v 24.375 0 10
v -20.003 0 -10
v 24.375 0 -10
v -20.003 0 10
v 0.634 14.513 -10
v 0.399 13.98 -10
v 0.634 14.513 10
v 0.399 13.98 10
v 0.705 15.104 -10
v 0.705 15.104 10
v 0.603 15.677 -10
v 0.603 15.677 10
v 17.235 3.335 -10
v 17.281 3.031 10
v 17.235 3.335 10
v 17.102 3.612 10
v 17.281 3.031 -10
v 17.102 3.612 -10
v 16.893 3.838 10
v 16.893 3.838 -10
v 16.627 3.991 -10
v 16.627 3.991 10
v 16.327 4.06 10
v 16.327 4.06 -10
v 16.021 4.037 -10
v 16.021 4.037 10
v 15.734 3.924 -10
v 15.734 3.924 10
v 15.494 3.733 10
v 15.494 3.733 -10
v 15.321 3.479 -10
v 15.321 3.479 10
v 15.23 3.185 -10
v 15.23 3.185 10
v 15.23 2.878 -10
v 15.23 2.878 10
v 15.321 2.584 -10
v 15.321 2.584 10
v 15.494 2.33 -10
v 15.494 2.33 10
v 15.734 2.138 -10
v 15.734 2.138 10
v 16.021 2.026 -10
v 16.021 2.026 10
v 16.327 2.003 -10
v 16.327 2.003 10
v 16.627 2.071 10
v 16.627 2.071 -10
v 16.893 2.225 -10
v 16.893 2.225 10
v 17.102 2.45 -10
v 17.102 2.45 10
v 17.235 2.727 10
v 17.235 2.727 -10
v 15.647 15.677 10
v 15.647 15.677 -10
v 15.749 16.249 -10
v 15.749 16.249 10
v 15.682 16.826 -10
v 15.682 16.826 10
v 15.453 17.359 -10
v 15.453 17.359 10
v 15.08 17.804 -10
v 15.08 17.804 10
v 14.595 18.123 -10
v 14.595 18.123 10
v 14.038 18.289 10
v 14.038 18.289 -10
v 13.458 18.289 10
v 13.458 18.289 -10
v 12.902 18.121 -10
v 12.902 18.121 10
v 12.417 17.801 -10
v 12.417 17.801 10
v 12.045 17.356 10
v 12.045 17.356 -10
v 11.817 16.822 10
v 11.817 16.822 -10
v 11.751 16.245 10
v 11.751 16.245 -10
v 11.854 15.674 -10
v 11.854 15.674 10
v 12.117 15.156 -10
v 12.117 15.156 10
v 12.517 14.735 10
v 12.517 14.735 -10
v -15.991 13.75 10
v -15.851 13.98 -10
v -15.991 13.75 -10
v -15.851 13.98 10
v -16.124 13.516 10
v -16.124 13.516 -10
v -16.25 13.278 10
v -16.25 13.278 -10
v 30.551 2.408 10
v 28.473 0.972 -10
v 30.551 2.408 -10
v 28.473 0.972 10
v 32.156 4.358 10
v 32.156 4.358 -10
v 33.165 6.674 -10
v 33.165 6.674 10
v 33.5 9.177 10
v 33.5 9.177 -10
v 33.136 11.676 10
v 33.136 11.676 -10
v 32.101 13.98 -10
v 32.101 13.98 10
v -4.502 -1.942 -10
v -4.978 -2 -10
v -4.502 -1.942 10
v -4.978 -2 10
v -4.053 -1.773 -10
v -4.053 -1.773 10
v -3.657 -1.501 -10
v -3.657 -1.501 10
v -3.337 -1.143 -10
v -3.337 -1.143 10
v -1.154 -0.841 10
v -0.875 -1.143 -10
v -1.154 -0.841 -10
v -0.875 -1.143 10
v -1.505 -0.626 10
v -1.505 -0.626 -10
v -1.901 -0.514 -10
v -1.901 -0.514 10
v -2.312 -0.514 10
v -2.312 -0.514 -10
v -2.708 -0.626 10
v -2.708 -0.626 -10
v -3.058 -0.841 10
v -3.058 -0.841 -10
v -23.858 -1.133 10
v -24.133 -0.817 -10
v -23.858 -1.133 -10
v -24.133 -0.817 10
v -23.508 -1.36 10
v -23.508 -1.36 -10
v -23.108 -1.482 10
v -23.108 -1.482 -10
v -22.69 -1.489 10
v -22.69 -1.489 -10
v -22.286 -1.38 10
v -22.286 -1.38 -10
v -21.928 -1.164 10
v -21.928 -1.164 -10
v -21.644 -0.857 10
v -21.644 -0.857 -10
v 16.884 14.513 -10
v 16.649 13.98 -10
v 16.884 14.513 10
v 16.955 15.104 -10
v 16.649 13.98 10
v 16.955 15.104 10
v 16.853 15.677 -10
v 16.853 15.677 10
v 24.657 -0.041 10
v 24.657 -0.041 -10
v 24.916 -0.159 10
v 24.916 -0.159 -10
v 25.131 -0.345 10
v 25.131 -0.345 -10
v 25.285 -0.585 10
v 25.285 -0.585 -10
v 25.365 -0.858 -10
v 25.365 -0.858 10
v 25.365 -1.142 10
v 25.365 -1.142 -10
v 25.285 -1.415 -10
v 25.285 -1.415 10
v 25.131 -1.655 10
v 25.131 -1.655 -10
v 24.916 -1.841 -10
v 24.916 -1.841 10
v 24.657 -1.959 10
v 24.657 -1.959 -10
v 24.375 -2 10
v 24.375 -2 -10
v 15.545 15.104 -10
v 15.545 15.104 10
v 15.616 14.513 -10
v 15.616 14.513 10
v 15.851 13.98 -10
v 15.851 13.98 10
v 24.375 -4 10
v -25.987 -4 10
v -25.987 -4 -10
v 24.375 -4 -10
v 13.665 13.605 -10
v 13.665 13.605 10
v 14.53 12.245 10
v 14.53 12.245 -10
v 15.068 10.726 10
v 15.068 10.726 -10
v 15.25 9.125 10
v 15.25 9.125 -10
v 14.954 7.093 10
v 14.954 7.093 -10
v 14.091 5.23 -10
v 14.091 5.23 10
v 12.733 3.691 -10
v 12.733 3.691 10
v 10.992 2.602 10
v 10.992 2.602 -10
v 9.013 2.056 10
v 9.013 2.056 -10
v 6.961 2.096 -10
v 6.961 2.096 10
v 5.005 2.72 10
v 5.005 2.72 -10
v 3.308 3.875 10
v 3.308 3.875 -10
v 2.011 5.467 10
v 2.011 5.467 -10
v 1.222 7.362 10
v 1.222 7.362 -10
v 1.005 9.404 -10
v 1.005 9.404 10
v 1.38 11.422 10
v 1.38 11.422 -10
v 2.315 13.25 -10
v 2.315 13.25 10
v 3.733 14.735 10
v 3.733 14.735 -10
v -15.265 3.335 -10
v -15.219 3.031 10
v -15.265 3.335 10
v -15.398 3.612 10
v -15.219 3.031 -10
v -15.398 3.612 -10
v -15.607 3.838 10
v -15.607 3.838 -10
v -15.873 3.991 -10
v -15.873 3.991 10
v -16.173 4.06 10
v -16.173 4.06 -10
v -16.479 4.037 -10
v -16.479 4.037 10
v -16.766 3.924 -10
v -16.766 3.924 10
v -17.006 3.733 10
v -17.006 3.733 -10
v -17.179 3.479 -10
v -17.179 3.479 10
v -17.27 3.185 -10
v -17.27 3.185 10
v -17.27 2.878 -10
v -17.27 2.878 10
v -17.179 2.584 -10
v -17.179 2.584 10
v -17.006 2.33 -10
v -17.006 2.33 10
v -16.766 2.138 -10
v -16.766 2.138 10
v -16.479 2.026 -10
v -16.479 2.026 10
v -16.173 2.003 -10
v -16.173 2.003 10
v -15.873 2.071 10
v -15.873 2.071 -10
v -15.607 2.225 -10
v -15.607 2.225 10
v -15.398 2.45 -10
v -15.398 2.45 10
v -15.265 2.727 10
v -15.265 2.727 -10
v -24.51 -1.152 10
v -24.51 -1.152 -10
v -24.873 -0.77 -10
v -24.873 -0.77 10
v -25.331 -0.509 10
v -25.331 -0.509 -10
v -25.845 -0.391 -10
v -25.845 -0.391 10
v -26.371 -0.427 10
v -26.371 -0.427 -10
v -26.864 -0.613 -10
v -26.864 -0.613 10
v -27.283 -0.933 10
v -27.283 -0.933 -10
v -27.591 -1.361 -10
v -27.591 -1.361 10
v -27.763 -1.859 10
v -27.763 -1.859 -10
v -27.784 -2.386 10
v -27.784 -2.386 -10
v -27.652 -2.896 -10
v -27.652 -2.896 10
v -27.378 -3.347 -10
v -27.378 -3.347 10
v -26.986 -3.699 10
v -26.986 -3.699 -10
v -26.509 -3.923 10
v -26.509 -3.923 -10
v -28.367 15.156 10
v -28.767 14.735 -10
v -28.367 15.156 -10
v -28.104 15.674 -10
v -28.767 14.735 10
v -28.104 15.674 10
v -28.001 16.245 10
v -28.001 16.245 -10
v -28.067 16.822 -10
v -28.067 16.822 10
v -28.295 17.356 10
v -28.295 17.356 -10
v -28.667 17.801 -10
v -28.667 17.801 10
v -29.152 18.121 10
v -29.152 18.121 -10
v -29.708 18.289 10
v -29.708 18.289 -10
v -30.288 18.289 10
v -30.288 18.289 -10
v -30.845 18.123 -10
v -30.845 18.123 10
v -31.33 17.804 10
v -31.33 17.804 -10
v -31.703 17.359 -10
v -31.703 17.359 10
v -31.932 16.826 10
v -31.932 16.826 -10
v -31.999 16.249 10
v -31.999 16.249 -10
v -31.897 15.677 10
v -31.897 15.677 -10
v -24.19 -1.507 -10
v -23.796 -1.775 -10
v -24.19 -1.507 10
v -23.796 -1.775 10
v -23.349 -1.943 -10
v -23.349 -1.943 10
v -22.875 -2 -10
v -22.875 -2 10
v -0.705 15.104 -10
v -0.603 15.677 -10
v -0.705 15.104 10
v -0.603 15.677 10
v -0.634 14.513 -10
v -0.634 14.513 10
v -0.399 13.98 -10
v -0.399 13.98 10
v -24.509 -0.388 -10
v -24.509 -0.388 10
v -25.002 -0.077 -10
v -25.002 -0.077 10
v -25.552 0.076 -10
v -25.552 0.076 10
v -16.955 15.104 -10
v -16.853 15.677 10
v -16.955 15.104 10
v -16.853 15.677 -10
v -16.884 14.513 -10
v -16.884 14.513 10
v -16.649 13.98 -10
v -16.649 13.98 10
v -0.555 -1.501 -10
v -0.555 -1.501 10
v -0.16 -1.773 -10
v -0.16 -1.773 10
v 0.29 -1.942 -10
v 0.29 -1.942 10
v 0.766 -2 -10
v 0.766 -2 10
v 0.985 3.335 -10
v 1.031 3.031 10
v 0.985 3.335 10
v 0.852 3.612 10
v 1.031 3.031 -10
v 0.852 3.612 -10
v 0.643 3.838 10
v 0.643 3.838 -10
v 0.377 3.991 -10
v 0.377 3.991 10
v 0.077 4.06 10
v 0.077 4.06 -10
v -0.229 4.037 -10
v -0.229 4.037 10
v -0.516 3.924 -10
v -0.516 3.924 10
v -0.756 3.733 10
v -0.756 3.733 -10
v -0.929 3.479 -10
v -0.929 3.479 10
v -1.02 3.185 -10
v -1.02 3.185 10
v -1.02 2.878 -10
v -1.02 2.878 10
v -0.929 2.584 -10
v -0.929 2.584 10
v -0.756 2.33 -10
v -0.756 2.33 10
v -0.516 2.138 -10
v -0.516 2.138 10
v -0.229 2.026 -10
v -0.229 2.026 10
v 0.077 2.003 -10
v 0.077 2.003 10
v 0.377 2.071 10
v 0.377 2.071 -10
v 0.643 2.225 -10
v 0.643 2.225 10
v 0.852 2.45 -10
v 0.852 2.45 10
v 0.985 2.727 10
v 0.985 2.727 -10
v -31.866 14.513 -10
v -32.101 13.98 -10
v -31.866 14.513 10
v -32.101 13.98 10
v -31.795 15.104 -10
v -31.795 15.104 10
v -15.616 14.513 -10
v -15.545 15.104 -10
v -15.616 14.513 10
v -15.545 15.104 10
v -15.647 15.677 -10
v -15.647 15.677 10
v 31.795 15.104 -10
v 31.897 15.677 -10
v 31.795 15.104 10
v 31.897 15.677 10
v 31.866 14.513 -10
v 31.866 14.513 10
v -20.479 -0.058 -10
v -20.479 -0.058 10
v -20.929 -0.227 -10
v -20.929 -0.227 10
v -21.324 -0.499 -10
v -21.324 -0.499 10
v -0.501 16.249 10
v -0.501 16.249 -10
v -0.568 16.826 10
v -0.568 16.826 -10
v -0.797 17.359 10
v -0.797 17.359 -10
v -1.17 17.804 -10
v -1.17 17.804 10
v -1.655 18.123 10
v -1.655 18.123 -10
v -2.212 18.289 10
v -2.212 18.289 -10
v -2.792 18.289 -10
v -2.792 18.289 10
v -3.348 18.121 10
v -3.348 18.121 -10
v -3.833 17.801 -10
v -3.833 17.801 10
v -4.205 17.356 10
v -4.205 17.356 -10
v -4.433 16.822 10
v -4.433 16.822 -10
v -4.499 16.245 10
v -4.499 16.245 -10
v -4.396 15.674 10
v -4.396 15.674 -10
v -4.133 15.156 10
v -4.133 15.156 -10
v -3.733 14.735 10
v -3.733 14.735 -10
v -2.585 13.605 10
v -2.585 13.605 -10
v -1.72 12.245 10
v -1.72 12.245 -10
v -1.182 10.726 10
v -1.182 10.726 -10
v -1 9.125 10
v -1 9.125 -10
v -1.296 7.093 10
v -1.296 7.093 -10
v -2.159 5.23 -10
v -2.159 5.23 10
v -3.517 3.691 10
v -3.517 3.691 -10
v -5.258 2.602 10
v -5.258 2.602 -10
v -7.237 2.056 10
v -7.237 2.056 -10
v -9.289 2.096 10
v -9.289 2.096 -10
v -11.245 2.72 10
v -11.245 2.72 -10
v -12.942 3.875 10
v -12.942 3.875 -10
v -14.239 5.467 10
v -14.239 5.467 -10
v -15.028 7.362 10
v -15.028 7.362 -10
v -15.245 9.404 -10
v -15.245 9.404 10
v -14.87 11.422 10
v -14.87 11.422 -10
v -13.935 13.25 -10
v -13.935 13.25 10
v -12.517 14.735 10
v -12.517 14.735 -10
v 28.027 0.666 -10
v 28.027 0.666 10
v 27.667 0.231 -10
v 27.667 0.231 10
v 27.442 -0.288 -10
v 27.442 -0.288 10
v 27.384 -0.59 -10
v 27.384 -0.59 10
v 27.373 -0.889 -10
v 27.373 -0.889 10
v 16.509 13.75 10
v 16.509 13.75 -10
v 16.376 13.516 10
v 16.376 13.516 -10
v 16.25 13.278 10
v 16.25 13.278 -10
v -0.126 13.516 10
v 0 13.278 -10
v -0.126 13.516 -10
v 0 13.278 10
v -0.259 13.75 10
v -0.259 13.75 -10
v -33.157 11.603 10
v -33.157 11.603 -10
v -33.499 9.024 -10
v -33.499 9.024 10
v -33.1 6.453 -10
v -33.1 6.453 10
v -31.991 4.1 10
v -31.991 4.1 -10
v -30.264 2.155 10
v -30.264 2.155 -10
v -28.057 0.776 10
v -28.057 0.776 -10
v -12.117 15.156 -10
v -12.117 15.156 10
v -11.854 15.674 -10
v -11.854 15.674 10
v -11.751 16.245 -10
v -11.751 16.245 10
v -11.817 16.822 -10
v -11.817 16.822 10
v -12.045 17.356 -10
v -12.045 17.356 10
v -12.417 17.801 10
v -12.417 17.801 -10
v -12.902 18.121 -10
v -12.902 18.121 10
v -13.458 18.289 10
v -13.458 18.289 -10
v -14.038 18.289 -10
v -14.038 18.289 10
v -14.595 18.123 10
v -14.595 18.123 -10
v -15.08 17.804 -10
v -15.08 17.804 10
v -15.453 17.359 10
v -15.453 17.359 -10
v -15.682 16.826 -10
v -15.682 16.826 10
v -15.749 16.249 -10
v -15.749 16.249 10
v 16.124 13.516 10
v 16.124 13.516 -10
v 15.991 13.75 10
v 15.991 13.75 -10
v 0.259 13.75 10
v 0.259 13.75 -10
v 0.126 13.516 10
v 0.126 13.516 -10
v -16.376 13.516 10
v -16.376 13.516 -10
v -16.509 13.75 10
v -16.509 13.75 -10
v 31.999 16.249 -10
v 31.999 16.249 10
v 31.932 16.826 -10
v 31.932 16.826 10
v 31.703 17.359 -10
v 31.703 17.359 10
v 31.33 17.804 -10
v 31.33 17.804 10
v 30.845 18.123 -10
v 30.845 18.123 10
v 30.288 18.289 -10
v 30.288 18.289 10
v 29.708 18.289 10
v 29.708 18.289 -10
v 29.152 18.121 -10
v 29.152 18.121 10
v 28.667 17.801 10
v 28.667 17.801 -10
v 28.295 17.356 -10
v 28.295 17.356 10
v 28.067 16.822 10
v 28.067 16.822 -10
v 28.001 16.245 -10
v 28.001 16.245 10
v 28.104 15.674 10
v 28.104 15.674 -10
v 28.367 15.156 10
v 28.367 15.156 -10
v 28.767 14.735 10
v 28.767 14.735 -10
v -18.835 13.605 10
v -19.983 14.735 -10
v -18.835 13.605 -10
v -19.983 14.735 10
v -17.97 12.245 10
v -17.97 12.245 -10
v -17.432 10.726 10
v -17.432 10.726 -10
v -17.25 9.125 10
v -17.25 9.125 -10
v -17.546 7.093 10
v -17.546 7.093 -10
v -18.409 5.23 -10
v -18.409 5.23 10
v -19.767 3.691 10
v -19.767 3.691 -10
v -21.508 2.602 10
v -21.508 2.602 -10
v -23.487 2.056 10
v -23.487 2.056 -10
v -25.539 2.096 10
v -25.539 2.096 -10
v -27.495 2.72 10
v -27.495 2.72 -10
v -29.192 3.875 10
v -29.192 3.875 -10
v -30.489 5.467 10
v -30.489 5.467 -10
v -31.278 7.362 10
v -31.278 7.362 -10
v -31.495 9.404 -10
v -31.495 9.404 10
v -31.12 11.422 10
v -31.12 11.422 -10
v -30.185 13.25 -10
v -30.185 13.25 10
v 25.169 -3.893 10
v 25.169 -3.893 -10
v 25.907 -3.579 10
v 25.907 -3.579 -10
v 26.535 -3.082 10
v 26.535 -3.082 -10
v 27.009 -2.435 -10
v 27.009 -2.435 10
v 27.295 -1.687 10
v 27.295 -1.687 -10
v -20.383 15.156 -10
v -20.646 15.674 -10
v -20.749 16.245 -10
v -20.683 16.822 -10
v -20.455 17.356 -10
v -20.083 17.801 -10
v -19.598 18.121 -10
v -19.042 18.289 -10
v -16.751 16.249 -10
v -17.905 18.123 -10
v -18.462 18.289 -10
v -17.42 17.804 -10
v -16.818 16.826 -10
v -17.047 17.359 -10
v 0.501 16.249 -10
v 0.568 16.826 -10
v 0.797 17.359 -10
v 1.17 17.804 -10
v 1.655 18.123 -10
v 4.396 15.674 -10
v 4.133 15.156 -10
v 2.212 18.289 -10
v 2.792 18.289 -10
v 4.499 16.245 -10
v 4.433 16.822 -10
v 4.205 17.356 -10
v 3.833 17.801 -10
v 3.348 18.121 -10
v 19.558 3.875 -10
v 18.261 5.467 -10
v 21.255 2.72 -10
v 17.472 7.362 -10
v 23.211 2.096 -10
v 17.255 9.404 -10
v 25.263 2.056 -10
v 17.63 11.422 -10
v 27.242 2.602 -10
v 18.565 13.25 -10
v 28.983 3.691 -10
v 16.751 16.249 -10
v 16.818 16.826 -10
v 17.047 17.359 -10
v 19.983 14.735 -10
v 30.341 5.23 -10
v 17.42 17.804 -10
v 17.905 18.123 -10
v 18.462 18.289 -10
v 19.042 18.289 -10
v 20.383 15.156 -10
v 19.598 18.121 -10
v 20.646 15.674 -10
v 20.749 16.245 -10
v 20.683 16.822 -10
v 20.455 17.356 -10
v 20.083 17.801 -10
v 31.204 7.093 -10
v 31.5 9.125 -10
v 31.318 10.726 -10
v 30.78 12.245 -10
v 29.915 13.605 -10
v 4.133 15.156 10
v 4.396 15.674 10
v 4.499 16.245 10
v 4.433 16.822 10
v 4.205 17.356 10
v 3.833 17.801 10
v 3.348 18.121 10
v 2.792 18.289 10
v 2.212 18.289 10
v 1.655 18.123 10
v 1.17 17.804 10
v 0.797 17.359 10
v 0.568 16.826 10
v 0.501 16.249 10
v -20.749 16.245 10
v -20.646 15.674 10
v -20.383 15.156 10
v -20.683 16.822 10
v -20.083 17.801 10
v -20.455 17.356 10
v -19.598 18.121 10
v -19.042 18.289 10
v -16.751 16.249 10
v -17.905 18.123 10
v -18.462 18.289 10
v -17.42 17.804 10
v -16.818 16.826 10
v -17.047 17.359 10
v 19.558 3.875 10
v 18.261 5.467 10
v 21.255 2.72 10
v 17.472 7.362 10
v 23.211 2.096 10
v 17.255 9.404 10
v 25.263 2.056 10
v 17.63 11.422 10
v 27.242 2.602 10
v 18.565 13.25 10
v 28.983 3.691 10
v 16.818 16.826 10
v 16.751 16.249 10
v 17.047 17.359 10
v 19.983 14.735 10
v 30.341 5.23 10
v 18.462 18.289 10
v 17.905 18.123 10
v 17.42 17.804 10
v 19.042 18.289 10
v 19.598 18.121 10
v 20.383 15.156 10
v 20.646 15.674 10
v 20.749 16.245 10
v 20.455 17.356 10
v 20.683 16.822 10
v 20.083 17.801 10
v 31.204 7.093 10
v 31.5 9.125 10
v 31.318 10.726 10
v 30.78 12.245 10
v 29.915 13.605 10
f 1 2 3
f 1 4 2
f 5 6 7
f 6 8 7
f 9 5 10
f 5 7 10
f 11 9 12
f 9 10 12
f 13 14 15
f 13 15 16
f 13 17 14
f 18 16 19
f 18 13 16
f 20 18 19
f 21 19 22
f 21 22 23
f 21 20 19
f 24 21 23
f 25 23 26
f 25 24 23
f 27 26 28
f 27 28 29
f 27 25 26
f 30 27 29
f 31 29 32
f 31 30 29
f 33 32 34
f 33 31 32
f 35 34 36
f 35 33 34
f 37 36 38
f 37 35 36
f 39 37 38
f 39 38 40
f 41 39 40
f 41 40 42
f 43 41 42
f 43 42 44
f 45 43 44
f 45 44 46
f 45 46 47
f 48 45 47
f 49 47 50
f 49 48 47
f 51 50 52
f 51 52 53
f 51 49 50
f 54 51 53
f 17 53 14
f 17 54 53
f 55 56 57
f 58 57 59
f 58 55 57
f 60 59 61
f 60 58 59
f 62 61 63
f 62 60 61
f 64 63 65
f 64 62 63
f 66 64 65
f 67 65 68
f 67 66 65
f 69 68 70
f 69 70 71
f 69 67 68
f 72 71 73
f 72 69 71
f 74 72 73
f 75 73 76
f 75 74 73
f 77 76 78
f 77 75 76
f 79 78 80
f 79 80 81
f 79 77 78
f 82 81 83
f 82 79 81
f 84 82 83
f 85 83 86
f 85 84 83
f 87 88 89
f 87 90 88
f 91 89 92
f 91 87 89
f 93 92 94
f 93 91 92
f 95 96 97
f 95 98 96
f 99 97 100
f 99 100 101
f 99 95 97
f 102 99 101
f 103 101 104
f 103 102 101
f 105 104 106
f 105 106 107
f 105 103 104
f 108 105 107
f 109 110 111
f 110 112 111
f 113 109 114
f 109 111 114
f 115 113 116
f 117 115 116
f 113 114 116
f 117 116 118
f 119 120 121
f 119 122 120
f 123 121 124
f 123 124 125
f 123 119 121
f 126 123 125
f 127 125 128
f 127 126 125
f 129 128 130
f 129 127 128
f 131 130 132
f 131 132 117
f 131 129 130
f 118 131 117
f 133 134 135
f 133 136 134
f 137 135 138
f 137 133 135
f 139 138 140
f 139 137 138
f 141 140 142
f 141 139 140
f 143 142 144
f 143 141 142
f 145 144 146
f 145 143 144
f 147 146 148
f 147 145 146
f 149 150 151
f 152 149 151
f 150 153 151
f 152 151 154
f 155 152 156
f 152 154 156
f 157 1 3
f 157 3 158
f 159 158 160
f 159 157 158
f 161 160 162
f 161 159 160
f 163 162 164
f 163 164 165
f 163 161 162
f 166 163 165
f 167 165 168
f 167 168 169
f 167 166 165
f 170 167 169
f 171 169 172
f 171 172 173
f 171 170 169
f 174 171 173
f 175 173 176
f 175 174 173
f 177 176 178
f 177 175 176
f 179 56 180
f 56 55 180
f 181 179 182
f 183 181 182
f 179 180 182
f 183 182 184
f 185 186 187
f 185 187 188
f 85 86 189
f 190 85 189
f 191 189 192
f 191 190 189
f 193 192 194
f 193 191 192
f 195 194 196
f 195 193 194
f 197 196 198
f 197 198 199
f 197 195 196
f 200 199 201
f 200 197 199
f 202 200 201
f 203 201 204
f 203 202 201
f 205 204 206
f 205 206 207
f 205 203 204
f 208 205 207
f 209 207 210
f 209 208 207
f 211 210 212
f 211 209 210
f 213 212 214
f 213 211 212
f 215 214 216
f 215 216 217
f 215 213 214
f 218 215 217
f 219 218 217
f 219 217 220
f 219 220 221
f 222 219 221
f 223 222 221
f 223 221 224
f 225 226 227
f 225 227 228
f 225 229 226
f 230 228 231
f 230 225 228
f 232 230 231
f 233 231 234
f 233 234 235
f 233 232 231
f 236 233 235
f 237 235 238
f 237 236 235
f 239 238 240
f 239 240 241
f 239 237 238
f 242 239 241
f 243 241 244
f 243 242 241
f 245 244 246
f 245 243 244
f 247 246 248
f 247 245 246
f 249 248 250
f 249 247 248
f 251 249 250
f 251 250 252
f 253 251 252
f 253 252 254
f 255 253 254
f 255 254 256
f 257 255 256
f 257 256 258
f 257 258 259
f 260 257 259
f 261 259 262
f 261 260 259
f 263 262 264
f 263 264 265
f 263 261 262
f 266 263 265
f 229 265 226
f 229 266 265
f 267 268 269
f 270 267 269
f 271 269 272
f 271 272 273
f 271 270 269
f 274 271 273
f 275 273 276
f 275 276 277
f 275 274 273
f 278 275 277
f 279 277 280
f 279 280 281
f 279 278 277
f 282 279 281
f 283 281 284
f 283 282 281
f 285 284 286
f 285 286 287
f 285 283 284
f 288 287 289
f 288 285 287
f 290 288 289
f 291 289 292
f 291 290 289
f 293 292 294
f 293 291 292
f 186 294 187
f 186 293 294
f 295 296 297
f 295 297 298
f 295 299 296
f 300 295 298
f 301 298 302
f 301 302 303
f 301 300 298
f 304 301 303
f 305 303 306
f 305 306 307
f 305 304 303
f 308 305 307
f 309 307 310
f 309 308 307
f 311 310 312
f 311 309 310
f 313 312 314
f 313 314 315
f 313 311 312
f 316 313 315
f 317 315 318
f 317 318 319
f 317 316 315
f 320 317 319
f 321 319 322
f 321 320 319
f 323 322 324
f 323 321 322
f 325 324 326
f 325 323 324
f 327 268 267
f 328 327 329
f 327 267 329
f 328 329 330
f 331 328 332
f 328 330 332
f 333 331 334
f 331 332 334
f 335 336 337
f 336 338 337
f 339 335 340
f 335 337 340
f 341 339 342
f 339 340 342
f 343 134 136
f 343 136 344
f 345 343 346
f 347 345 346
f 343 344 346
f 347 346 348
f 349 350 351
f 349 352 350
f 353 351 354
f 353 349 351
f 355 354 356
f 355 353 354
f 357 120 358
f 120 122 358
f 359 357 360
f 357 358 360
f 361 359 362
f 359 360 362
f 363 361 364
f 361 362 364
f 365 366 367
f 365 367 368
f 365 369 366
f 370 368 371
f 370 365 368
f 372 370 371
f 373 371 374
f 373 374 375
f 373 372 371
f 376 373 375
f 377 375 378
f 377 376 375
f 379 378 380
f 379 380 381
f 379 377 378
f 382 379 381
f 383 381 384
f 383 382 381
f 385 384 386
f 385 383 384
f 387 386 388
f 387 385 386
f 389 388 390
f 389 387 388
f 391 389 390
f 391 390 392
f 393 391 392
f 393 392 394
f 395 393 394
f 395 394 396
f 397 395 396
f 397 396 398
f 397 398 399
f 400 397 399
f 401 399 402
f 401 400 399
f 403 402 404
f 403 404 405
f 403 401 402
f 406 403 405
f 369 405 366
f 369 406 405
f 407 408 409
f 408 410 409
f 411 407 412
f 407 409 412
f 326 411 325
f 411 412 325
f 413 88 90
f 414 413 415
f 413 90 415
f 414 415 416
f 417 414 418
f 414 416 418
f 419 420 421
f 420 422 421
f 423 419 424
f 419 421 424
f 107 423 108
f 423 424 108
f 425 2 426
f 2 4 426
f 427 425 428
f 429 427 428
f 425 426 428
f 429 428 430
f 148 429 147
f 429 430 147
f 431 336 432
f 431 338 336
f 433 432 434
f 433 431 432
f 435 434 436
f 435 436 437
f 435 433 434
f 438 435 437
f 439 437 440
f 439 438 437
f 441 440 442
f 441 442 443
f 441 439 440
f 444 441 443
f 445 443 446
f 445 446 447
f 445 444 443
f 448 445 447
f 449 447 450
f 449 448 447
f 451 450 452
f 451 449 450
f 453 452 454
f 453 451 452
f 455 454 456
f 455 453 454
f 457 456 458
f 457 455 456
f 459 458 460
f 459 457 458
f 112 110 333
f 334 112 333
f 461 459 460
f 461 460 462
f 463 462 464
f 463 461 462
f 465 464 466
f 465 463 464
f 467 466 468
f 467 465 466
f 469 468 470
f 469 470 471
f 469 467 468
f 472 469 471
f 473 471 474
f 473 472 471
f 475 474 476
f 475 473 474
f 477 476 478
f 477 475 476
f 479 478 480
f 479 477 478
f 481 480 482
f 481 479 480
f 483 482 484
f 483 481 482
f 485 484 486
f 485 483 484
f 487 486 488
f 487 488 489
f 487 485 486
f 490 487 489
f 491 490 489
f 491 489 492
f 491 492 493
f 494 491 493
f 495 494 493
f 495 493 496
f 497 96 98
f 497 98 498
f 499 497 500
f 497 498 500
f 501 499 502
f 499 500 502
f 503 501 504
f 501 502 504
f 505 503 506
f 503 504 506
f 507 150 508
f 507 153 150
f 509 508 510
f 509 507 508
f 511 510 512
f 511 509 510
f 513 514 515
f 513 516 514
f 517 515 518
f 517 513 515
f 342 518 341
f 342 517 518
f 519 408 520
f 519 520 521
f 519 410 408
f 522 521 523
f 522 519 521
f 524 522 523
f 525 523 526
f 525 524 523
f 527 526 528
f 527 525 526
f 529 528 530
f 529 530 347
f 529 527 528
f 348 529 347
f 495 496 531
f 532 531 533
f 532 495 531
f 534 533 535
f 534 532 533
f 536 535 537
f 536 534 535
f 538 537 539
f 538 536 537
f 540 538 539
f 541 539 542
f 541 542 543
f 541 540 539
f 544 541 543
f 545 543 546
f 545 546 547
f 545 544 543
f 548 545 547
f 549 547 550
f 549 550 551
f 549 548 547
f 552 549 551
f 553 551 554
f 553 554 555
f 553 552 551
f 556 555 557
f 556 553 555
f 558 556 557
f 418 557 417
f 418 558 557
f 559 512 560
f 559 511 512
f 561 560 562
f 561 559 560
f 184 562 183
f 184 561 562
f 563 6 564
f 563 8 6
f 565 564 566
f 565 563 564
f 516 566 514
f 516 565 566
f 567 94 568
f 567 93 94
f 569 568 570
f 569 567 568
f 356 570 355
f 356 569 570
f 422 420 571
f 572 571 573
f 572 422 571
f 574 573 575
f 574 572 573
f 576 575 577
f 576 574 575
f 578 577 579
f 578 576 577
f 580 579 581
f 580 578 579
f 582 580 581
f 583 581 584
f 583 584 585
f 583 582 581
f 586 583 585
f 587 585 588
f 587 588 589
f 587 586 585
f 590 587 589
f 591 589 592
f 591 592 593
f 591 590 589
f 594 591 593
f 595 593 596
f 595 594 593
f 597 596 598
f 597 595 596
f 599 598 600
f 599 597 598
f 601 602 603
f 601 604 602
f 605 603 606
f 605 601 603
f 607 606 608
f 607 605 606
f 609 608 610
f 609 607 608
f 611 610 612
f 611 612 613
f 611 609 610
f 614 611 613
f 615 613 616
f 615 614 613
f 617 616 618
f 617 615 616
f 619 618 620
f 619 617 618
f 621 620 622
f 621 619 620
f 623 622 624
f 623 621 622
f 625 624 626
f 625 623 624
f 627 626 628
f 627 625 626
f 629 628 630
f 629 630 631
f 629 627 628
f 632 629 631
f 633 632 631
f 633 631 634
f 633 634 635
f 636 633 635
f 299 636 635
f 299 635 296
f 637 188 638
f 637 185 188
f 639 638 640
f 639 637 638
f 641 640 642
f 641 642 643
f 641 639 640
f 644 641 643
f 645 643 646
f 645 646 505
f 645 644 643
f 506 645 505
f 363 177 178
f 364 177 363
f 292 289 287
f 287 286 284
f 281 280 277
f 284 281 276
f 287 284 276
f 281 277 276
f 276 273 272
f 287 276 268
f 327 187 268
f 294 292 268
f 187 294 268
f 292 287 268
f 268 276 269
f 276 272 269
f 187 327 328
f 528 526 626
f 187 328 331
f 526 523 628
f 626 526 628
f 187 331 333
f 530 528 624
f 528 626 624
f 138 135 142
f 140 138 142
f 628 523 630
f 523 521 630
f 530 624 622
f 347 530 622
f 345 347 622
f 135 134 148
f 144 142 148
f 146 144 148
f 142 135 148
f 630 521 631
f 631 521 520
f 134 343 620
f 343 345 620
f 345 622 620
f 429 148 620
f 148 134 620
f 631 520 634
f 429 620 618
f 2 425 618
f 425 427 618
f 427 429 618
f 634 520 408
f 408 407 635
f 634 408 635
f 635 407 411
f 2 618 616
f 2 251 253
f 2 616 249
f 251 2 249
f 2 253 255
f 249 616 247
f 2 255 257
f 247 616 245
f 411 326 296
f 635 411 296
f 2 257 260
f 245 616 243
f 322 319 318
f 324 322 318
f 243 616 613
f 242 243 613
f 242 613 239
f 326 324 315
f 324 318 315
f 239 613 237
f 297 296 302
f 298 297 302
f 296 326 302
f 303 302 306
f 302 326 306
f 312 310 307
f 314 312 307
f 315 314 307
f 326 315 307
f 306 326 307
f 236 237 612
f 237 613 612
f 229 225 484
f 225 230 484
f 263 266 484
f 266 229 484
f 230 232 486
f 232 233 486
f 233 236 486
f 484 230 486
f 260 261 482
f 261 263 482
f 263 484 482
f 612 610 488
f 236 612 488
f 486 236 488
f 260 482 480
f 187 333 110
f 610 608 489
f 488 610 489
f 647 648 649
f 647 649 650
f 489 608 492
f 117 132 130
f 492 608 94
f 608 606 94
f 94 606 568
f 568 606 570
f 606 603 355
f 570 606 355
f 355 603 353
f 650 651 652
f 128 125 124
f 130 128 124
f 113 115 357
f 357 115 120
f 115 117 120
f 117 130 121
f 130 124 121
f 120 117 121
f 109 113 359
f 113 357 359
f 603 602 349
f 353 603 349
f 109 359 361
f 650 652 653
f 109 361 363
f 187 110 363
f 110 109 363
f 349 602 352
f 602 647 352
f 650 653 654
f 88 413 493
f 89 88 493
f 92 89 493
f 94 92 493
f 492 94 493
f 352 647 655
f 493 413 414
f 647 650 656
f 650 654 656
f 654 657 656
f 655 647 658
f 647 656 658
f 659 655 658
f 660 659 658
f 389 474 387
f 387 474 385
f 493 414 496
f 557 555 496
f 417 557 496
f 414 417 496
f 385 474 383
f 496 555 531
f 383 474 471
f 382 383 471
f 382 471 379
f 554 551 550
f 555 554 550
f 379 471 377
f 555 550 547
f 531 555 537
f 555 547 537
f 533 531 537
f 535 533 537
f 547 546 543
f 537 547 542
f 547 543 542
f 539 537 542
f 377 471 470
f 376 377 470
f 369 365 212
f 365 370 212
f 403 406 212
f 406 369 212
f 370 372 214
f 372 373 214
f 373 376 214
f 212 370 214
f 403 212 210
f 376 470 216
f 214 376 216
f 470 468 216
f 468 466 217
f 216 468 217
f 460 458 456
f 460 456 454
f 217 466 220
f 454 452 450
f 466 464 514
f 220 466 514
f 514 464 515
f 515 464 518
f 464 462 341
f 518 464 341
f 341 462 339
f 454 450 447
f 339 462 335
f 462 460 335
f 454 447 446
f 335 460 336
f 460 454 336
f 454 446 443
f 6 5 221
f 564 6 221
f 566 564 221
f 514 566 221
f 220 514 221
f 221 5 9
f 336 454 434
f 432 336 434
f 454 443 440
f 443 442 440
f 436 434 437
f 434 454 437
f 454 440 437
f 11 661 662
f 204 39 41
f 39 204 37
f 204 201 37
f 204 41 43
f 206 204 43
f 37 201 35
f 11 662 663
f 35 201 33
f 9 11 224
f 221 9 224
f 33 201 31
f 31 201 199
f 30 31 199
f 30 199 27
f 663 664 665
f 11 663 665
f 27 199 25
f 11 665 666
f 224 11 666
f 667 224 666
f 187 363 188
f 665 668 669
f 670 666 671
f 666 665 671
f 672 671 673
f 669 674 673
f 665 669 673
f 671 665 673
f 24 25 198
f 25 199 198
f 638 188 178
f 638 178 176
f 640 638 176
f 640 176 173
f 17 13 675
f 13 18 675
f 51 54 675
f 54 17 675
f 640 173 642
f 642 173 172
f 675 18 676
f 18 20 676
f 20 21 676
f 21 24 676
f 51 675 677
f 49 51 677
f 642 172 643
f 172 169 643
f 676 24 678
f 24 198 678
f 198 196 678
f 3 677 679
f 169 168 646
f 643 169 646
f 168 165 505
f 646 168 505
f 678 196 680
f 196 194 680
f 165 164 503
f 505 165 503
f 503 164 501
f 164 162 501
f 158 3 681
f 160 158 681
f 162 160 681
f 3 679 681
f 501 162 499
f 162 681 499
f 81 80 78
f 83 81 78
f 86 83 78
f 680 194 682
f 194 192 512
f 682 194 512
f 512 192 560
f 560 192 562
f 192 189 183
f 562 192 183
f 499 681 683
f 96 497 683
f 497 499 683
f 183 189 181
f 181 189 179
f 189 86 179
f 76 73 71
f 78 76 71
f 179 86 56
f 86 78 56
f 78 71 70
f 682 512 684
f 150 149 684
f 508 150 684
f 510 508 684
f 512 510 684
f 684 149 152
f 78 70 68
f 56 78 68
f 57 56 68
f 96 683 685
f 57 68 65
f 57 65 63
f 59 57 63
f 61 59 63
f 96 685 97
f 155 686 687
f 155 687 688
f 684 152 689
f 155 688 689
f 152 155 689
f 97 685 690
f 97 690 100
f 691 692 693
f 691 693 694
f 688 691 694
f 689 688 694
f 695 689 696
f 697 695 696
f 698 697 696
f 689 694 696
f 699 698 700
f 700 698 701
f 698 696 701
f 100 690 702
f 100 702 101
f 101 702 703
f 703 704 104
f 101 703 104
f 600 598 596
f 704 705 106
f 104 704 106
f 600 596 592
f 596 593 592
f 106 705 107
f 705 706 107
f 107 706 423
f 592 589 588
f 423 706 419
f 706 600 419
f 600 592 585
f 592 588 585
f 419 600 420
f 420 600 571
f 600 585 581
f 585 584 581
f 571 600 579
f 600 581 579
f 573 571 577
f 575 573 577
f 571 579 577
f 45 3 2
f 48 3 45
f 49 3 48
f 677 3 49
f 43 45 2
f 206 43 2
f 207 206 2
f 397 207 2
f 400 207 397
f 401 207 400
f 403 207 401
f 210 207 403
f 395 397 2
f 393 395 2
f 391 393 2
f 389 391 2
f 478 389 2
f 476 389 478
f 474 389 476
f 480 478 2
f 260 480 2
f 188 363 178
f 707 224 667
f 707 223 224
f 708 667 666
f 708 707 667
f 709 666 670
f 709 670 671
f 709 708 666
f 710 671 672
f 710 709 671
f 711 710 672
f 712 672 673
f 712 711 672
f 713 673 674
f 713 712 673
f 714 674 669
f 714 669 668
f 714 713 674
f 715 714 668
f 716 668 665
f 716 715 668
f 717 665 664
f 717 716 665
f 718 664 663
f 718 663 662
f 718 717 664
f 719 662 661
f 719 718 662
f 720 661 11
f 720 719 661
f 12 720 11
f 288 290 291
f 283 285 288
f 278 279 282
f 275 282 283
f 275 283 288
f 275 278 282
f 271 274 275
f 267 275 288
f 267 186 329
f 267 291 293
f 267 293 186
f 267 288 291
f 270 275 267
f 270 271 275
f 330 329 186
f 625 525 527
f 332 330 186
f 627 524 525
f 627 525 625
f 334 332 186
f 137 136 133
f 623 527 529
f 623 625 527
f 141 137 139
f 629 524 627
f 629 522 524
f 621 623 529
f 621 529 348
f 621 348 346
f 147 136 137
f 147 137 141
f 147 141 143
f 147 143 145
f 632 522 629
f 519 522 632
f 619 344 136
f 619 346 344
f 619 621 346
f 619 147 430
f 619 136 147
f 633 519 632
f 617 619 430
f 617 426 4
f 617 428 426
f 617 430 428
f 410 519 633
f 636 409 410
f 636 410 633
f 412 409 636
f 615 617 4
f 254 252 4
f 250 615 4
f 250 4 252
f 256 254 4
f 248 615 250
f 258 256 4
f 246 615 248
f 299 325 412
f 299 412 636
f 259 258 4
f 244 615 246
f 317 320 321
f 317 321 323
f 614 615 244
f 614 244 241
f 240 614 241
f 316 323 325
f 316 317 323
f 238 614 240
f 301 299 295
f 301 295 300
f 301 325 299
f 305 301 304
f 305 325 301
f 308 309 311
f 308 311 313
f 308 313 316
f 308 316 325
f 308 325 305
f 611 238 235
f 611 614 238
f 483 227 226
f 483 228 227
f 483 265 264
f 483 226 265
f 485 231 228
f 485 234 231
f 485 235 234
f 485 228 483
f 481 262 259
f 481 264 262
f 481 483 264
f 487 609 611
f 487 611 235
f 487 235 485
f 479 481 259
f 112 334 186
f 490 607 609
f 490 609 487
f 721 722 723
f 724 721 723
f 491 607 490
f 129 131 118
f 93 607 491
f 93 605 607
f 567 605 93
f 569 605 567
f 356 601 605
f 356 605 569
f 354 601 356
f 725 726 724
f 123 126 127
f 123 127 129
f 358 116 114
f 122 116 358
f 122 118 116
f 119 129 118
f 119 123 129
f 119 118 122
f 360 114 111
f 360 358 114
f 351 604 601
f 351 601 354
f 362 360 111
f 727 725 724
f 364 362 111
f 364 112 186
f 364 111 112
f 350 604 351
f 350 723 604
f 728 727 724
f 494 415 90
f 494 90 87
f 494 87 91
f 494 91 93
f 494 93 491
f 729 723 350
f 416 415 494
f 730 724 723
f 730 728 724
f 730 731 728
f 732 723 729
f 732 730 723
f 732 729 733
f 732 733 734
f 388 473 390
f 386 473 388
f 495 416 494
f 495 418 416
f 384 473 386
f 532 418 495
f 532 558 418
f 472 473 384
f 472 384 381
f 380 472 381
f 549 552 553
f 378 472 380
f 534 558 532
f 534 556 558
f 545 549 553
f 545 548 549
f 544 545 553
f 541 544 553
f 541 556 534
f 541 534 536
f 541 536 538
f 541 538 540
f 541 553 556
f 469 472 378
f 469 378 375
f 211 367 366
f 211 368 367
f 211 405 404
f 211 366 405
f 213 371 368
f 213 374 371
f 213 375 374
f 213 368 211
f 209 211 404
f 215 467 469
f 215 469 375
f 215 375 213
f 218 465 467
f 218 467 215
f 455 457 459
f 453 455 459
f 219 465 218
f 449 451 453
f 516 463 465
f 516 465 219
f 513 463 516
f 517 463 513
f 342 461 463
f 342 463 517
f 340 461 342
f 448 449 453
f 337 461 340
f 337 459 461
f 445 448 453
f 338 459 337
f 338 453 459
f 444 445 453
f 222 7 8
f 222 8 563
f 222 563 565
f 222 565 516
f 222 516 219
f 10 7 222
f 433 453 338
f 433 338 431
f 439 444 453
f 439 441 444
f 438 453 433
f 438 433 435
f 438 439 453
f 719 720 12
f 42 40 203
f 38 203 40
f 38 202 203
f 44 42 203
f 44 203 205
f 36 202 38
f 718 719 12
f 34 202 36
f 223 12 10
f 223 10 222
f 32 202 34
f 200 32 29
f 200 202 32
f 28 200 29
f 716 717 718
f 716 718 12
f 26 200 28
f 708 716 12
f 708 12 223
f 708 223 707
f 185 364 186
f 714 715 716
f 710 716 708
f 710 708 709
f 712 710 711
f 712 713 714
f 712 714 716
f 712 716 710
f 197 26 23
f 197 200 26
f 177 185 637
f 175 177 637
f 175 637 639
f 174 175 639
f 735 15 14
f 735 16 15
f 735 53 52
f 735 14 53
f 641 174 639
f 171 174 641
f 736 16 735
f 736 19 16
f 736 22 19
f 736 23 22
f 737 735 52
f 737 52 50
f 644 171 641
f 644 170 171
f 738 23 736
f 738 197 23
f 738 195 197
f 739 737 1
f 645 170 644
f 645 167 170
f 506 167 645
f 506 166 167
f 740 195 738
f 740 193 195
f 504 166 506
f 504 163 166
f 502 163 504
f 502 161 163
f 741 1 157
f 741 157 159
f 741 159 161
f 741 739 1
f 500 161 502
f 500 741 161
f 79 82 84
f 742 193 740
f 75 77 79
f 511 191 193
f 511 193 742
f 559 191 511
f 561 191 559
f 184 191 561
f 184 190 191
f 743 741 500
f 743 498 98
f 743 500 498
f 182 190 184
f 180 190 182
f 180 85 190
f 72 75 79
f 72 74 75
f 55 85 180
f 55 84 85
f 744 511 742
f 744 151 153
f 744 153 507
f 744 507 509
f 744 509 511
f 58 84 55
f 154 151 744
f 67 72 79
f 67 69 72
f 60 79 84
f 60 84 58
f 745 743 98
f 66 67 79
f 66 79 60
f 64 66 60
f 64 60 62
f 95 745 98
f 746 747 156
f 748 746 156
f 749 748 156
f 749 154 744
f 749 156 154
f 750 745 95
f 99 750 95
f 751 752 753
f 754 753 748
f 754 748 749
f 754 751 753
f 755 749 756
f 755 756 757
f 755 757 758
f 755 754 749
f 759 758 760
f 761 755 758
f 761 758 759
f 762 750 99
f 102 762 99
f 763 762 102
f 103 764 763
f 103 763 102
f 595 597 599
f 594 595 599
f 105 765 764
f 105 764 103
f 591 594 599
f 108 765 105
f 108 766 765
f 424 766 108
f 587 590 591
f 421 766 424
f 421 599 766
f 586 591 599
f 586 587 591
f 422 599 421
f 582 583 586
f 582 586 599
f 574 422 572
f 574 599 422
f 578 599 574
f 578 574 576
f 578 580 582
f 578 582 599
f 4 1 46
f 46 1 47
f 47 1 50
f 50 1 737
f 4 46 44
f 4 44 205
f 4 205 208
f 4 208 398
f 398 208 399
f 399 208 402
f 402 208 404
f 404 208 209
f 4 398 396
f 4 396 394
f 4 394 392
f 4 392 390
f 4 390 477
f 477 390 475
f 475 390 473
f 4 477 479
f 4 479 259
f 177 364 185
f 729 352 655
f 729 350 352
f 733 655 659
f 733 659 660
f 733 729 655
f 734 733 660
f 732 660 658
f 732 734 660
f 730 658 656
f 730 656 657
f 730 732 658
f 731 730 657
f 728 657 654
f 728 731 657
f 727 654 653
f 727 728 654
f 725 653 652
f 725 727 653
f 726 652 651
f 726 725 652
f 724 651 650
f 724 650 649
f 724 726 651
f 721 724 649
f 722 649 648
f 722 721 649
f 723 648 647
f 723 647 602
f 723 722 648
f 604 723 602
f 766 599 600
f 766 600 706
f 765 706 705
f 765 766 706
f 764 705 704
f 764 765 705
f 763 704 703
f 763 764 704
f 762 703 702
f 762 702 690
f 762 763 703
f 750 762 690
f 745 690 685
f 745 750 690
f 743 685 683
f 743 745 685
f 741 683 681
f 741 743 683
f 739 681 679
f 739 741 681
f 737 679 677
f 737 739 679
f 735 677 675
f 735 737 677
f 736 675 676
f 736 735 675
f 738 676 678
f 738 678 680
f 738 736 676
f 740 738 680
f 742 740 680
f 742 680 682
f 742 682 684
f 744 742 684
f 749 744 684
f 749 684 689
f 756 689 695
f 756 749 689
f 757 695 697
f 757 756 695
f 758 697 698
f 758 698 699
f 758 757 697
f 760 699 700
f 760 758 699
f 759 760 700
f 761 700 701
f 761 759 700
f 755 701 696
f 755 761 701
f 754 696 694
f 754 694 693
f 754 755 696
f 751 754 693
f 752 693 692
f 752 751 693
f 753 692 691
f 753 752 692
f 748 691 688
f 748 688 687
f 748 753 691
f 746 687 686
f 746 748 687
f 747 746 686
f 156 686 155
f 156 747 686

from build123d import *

# Parameters (mm, degrees)
F1_R     = 1.03125
F2_DEPTH = 10
F3_R     = 2


with BuildPart() as f2:
    # F1 (on Top) → F2 (new body, symmetric)
    with BuildSketch(Plane.XY):
        with BuildLine():
            ThreePointArc((-19.9828767123, 14.7352475904), (-17.9695529655, 12.2452360949), (-17.25, 9.125))
            ThreePointArc((-17.25, 9.125), (-27.4952360949, 2.7195529655), (-28.7671232877, 14.7352475904))
            ThreePointArc((-28.7671232877, 14.7352475904), (-29.8675330526, 18.3056622368), (-31.4302114786, 14.9120213402))
            ThreePointArc((-31.4302114786, 14.9120213402), (-32.6233996851, 5.2224972601), (-24.375, 0))
            Line((-24.375, 0), (-21.375, 0))
            Line((-21.375, 0), (24.375, 0))
            ThreePointArc((24.375, 0), (25.7175606637, 0.099305796), (27.0308996167, 0.3950617284))
            ThreePointArc((27.0308996167, 0.3950617284), (33.107808756, 6.4785540378), (31.4302114786, 14.9120213402))
            ThreePointArc((31.4302114786, 14.9120213402), (29.8675330526, 18.3056622368), (28.7671232877, 14.7352475904))
            ThreePointArc((28.7671232877, 14.7352475904), (30.7804470345, 12.2452360949), (31.5, 9.125))
            ThreePointArc((31.5, 9.125), (21.2547639051, 2.7195529655), (19.9828767123, 14.7352475904))
            ThreePointArc((19.9828767123, 14.7352475904), (18.8824669474, 18.3056622368), (17.3197885214, 14.9120213402))
            ThreePointArc((17.3197885214, 14.9120213402), (16.7410654482, 14.1238666974), (16.25, 13.2783119315))
            ThreePointArc((16.25, 13.2783119315), (15.7589345518, 14.1238666974), (15.1802114786, 14.9120213402))
            ThreePointArc((15.1802114786, 14.9120213402), (13.6175330526, 18.3056622368), (12.5171232877, 14.7352475904))
            ThreePointArc((12.5171232877, 14.7352475904), (14.5304470345, 12.2452360949), (15.25, 9.125))
            ThreePointArc((15.25, 9.125), (5.0047639051, 2.7195529655), (3.7328767123, 14.7352475904))
            ThreePointArc((3.7328767123, 14.7352475904), (2.6324669474, 18.3056622368), (1.0697885214, 14.9120213402))
            ThreePointArc((1.0697885214, 14.9120213402), (0.4910654482, 14.1238666974), (0, 13.2783119315))
            ThreePointArc((0, 13.2783119315), (-0.4910654482, 14.1238666974), (-1.0697885214, 14.9120213402))
            ThreePointArc((-1.0697885214, 14.9120213402), (-2.6324669474, 18.3056622368), (-3.7328767123, 14.7352475904))
            ThreePointArc((-3.7328767123, 14.7352475904), (-1.7195529655, 12.2452360949), (-1, 9.125))
            ThreePointArc((-1, 9.125), (-11.2452360949, 2.7195529655), (-12.5171232877, 14.7352475904))
            ThreePointArc((-12.5171232877, 14.7352475904), (-13.6175330526, 18.3056622368), (-15.1802114786, 14.9120213402))
            ThreePointArc((-15.1802114786, 14.9120213402), (-15.7589345518, 14.1238666974), (-16.25, 13.2783119315))
            ThreePointArc((-16.25, 13.2783119315), (-16.7410654482, 14.1238666974), (-17.3197885214, 14.9120213402))
            ThreePointArc((-17.3197885214, 14.9120213402), (-18.8824669474, 18.3056622368), (-19.9828767123, 14.7352475904))
        make_face()
        with Locations((-16.25, 3.03125)):
            Circle(F1_R, mode=Mode.SUBTRACT)
        with Locations((0, 3.03125)):
            Circle(F1_R, mode=Mode.SUBTRACT)
        with Locations((16.25, 3.03125)):
            Circle(F1_R, mode=Mode.SUBTRACT)
        with BuildLine():
            ThreePointArc((27.0308996167, 0.3950617284), (25.7175606637, 0.099305796), (24.375, 0))
            ThreePointArc((24.375, 0), (25.375, -1), (24.375, -2))
            Line((24.375, -2), (-0.6061253537, -2))
            Line((-0.6061253537, -2), (-3.6061253537, -2))
            Line((-3.6061253537, -2), (-24.1903478035, -2))
            ThreePointArc((-24.1903478035, -2), (-27.3314384085, -0.985167759), (-25.9871463178, -4))
            Line((-25.9871463178, -4), (24.375, -4))
            ThreePointArc((24.375, -4), (26.9426044463, -2.5515822271), (27.0308996167, 0.3950617284))
        make_face()
        with BuildLine():
            Line((-21.375, 0), (-24.375, 0))
            ThreePointArc((-24.375, 0), (-22.875, -1.5), (-21.375, 0))
        make_face()
        with BuildLine():
            Line((-3.6061253537, -2), (-0.6061253537, -2))
            ThreePointArc((-0.6061253537, -2), (-2.1061253537, -0.5), (-3.6061253537, -2))
        make_face()
    extrude(amount=F2_DEPTH, both=True)

    # F3
    f3_edges = [f2.edges().sort_by_distance(p)[0] for p in [
        (31.430211, 14.912021, 0),
        (15.180211, 14.912021, 0),
        (17.319789, 14.912021, 0),
        (1.069789, 14.912021, 0),
        (-15.180211, 14.912021, 0),
        (-31.430211, 14.912021, 0),
        (-17.319789, 14.912021, 0),
        (-1.069789, 14.912021, 0),
        (-24.375, 0, 0),
        (27.0309, 0.395062, 0),
        (-24.190348, -2, 0),
        (-0.606125, -2, 0),
        (-3.606125, -2, 0),
        (-21.375, 0, 0),
    ]]
    fillet(f3_edges, radius=F3_R)


solid = f2.part
